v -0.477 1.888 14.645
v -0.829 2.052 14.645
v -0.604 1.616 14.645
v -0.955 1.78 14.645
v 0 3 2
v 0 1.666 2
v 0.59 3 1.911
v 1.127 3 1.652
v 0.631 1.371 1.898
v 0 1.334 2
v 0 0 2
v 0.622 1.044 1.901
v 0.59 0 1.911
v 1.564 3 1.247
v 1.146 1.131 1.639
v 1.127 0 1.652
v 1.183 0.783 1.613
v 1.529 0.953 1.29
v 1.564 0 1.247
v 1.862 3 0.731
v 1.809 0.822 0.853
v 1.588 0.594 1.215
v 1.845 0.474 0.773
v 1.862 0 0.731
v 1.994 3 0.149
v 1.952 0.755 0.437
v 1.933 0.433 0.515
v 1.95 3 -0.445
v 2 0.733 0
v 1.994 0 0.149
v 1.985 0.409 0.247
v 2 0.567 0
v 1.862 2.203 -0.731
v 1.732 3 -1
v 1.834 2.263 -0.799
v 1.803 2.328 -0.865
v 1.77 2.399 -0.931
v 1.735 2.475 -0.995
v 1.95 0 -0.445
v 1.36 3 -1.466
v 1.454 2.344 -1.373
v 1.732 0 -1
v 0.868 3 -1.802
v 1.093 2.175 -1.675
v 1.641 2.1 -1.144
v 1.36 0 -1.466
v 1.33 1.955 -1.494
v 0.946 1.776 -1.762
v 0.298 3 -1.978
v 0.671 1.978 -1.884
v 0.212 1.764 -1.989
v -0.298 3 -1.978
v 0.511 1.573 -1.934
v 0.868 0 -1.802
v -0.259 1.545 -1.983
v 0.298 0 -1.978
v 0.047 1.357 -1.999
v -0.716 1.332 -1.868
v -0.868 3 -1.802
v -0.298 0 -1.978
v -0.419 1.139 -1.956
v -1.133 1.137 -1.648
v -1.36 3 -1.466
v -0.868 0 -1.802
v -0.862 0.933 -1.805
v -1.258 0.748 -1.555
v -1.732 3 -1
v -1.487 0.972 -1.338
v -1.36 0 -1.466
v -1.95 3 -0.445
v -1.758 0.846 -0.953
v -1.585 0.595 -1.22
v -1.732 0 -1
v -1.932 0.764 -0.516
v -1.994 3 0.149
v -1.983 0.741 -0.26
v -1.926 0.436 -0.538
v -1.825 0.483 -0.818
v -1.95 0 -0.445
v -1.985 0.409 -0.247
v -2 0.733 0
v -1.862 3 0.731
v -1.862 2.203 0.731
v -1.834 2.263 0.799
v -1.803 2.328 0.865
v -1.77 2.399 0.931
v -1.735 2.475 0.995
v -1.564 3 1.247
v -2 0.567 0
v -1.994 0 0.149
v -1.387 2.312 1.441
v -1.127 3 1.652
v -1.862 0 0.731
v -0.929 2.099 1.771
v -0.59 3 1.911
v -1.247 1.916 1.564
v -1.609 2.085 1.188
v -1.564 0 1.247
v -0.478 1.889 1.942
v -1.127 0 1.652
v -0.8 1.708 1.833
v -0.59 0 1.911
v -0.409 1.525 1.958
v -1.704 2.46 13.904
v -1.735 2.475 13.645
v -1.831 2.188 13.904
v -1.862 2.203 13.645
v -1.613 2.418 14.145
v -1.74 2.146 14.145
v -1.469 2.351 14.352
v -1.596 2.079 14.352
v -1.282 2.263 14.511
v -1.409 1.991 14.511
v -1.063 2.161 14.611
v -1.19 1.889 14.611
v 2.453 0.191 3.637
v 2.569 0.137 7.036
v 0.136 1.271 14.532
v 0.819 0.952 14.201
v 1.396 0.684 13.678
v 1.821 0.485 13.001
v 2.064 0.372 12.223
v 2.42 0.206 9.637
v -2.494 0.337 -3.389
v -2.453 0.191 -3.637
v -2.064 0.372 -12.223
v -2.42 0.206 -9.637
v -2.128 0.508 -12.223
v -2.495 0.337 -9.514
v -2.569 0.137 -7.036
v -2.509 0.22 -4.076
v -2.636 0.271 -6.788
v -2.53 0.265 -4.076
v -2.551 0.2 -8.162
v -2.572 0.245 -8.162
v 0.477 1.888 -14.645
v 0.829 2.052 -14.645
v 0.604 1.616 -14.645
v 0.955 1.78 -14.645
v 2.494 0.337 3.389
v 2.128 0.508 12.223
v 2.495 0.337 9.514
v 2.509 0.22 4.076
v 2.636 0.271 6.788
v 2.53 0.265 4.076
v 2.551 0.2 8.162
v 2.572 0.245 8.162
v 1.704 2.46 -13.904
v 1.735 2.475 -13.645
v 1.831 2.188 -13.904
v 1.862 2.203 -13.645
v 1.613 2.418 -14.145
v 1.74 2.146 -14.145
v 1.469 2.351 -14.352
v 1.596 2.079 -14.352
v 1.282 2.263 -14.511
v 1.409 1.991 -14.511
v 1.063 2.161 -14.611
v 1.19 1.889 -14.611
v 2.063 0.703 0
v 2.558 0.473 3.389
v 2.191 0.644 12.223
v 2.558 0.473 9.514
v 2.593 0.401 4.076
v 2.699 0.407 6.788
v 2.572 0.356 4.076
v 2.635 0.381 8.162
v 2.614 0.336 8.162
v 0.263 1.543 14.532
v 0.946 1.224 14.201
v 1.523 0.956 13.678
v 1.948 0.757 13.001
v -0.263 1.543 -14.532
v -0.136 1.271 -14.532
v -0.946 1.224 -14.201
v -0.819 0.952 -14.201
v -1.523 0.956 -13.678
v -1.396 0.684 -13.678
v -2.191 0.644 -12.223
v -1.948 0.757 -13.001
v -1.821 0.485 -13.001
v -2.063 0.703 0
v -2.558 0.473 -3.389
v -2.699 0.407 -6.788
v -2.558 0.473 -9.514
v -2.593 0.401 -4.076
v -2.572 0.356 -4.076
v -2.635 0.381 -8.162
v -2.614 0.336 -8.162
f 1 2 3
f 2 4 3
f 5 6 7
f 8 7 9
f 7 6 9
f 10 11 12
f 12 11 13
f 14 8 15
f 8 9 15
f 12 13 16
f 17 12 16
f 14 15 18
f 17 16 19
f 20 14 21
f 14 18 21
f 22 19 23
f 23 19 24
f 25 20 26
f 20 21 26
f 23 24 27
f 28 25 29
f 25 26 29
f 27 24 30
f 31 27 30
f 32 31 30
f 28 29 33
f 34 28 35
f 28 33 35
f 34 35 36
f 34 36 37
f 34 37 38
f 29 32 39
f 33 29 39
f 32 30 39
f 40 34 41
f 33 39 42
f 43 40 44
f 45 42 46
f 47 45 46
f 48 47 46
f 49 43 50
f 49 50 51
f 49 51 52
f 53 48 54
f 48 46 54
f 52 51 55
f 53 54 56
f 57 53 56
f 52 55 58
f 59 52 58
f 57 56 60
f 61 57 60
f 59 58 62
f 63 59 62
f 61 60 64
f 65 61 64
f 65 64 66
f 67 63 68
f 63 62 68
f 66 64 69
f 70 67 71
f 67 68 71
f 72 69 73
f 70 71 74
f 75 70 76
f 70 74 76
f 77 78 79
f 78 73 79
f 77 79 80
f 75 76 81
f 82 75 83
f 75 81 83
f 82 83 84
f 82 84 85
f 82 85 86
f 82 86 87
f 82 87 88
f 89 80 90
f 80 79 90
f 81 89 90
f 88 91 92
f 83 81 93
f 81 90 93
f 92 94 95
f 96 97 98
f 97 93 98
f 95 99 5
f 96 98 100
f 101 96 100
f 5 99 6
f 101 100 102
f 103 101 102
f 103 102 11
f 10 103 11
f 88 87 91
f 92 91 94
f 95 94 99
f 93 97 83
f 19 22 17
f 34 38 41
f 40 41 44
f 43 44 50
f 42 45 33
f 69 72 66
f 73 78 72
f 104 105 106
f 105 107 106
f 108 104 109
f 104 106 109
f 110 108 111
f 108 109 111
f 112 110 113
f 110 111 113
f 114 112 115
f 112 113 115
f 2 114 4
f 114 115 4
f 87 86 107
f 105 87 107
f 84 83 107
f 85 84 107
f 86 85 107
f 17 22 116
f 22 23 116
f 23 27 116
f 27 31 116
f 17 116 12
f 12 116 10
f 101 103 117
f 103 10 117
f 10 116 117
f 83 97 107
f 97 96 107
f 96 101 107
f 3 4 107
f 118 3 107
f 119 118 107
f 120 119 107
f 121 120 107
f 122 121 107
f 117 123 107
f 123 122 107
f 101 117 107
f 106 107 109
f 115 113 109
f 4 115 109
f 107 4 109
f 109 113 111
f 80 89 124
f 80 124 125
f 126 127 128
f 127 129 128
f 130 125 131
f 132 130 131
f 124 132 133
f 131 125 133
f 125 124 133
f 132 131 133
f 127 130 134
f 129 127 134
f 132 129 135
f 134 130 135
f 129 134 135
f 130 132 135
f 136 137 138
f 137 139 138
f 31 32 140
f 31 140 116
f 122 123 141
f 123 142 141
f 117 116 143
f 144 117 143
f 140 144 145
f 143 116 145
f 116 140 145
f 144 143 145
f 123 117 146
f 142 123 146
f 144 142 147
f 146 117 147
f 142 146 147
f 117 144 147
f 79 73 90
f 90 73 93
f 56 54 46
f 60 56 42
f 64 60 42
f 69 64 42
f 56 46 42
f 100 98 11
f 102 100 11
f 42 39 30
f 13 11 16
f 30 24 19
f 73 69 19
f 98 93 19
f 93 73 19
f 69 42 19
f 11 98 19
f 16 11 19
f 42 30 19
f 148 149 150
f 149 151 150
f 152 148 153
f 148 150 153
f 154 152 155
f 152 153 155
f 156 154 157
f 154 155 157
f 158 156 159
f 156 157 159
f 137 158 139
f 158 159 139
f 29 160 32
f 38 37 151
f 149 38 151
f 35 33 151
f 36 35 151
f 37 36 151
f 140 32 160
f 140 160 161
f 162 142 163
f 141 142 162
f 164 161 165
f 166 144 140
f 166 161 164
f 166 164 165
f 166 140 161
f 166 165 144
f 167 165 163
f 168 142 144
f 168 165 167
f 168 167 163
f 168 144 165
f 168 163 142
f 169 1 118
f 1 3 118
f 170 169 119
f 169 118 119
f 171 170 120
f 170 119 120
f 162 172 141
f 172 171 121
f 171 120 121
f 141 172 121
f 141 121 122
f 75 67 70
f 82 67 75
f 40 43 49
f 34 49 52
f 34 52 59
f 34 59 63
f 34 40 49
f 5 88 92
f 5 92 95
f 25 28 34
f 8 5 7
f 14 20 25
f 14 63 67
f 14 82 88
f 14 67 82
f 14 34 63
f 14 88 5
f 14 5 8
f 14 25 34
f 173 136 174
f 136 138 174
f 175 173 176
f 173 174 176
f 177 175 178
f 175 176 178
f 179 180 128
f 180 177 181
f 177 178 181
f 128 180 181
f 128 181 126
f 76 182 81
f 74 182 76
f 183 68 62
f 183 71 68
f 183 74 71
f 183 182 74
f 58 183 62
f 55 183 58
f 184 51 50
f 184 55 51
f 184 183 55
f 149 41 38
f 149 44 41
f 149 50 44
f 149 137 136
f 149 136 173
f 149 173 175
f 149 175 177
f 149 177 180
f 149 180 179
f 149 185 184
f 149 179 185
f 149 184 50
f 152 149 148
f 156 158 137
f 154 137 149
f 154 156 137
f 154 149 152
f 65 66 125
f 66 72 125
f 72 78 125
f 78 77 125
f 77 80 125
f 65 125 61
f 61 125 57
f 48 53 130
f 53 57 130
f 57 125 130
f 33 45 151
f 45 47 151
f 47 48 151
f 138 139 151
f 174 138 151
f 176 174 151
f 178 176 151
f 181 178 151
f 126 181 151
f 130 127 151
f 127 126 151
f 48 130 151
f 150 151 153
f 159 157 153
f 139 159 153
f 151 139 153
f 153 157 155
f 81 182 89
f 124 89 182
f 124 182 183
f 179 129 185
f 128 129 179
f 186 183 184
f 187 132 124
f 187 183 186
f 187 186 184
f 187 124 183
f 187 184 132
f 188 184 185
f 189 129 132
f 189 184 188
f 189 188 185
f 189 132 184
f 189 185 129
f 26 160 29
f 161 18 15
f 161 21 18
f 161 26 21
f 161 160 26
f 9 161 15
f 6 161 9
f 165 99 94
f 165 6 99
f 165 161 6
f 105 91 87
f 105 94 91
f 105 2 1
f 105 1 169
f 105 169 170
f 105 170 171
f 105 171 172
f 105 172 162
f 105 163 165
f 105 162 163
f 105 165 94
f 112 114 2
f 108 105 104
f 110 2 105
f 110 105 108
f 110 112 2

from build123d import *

# Parameters (mm, degrees)
SKETCH1_R           = 2
BOSS_EXTRUDE1_DEPTH = 3
BOSS_EXTRUDE2_DEPTH = 0.15
CIRPATTERN1_COUNT   = 2


with BuildPart() as part:
    # Sketch1 → Boss-Extrude1 (new body)
    with BuildSketch(Plane(origin=(0, 0, 0), x_dir=(1, 0, 0), z_dir=(0, 1, 0))):
        with Locations(Location((0, 0, 0), (0, 0, 270))):
            Circle(SKETCH1_R)
    extrude(amount=BOSS_EXTRUDE1_DEPTH)

    # Sketch3 → Boss-Extrude2 (add, symmetric)
    with BuildSketch(Plane(origin=(0.574533332, 1.232090707, 0), x_dir=(0.9063077870366496, -0.4226182617407003, 0), z_dir=(-0.42261826174070033, -0.9063077870366497, 0))):
        with BuildLine():
            Line((-1.825963844, 0), (-2.618118511, 0.610320395))
            Line((-2.618118511, 0.610320395), (-2.618118511, 13.644717252))
            ThreePointArc((-2.618118511, 13.644717252), (-2.325225292, 14.351824033), (-1.618118511, 14.644717252))
            Line((-1.618118511, 14.644717252), (-1.229872287, 14.644717252))
            ThreePointArc((-1.229872287, 14.644717252), (0.676144985, 13.961417094), (1.713907655, 12.222782692))
            add(Edge.make_bspline(
                [(1.572828445, 0), (2.462700646, 4.059259168), (2.506395313, 8.187064394), (1.713907655, 12.222782692)],
                knots=[0, 0, 0, 0, 0.833038136, 0.833038136, 0.833038136, 0.833038136], degree=3))
            Line((1.572828445, 0), (-1.825963844, 0))
        make_face()
    boss_extrude2 = extrude(amount=BOSS_EXTRUDE2_DEPTH, both=True)

    # CirPattern1: Boss-Extrude2 ×2 about axis
    cirpattern1_axis = Axis((0, 3.15, 0), (0, -1, 0))
    for i in range(1, CIRPATTERN1_COUNT):
        add(boss_extrude2.rotate(cirpattern1_axis, i * 360 / CIRPATTERN1_COUNT))


solid = part.part
